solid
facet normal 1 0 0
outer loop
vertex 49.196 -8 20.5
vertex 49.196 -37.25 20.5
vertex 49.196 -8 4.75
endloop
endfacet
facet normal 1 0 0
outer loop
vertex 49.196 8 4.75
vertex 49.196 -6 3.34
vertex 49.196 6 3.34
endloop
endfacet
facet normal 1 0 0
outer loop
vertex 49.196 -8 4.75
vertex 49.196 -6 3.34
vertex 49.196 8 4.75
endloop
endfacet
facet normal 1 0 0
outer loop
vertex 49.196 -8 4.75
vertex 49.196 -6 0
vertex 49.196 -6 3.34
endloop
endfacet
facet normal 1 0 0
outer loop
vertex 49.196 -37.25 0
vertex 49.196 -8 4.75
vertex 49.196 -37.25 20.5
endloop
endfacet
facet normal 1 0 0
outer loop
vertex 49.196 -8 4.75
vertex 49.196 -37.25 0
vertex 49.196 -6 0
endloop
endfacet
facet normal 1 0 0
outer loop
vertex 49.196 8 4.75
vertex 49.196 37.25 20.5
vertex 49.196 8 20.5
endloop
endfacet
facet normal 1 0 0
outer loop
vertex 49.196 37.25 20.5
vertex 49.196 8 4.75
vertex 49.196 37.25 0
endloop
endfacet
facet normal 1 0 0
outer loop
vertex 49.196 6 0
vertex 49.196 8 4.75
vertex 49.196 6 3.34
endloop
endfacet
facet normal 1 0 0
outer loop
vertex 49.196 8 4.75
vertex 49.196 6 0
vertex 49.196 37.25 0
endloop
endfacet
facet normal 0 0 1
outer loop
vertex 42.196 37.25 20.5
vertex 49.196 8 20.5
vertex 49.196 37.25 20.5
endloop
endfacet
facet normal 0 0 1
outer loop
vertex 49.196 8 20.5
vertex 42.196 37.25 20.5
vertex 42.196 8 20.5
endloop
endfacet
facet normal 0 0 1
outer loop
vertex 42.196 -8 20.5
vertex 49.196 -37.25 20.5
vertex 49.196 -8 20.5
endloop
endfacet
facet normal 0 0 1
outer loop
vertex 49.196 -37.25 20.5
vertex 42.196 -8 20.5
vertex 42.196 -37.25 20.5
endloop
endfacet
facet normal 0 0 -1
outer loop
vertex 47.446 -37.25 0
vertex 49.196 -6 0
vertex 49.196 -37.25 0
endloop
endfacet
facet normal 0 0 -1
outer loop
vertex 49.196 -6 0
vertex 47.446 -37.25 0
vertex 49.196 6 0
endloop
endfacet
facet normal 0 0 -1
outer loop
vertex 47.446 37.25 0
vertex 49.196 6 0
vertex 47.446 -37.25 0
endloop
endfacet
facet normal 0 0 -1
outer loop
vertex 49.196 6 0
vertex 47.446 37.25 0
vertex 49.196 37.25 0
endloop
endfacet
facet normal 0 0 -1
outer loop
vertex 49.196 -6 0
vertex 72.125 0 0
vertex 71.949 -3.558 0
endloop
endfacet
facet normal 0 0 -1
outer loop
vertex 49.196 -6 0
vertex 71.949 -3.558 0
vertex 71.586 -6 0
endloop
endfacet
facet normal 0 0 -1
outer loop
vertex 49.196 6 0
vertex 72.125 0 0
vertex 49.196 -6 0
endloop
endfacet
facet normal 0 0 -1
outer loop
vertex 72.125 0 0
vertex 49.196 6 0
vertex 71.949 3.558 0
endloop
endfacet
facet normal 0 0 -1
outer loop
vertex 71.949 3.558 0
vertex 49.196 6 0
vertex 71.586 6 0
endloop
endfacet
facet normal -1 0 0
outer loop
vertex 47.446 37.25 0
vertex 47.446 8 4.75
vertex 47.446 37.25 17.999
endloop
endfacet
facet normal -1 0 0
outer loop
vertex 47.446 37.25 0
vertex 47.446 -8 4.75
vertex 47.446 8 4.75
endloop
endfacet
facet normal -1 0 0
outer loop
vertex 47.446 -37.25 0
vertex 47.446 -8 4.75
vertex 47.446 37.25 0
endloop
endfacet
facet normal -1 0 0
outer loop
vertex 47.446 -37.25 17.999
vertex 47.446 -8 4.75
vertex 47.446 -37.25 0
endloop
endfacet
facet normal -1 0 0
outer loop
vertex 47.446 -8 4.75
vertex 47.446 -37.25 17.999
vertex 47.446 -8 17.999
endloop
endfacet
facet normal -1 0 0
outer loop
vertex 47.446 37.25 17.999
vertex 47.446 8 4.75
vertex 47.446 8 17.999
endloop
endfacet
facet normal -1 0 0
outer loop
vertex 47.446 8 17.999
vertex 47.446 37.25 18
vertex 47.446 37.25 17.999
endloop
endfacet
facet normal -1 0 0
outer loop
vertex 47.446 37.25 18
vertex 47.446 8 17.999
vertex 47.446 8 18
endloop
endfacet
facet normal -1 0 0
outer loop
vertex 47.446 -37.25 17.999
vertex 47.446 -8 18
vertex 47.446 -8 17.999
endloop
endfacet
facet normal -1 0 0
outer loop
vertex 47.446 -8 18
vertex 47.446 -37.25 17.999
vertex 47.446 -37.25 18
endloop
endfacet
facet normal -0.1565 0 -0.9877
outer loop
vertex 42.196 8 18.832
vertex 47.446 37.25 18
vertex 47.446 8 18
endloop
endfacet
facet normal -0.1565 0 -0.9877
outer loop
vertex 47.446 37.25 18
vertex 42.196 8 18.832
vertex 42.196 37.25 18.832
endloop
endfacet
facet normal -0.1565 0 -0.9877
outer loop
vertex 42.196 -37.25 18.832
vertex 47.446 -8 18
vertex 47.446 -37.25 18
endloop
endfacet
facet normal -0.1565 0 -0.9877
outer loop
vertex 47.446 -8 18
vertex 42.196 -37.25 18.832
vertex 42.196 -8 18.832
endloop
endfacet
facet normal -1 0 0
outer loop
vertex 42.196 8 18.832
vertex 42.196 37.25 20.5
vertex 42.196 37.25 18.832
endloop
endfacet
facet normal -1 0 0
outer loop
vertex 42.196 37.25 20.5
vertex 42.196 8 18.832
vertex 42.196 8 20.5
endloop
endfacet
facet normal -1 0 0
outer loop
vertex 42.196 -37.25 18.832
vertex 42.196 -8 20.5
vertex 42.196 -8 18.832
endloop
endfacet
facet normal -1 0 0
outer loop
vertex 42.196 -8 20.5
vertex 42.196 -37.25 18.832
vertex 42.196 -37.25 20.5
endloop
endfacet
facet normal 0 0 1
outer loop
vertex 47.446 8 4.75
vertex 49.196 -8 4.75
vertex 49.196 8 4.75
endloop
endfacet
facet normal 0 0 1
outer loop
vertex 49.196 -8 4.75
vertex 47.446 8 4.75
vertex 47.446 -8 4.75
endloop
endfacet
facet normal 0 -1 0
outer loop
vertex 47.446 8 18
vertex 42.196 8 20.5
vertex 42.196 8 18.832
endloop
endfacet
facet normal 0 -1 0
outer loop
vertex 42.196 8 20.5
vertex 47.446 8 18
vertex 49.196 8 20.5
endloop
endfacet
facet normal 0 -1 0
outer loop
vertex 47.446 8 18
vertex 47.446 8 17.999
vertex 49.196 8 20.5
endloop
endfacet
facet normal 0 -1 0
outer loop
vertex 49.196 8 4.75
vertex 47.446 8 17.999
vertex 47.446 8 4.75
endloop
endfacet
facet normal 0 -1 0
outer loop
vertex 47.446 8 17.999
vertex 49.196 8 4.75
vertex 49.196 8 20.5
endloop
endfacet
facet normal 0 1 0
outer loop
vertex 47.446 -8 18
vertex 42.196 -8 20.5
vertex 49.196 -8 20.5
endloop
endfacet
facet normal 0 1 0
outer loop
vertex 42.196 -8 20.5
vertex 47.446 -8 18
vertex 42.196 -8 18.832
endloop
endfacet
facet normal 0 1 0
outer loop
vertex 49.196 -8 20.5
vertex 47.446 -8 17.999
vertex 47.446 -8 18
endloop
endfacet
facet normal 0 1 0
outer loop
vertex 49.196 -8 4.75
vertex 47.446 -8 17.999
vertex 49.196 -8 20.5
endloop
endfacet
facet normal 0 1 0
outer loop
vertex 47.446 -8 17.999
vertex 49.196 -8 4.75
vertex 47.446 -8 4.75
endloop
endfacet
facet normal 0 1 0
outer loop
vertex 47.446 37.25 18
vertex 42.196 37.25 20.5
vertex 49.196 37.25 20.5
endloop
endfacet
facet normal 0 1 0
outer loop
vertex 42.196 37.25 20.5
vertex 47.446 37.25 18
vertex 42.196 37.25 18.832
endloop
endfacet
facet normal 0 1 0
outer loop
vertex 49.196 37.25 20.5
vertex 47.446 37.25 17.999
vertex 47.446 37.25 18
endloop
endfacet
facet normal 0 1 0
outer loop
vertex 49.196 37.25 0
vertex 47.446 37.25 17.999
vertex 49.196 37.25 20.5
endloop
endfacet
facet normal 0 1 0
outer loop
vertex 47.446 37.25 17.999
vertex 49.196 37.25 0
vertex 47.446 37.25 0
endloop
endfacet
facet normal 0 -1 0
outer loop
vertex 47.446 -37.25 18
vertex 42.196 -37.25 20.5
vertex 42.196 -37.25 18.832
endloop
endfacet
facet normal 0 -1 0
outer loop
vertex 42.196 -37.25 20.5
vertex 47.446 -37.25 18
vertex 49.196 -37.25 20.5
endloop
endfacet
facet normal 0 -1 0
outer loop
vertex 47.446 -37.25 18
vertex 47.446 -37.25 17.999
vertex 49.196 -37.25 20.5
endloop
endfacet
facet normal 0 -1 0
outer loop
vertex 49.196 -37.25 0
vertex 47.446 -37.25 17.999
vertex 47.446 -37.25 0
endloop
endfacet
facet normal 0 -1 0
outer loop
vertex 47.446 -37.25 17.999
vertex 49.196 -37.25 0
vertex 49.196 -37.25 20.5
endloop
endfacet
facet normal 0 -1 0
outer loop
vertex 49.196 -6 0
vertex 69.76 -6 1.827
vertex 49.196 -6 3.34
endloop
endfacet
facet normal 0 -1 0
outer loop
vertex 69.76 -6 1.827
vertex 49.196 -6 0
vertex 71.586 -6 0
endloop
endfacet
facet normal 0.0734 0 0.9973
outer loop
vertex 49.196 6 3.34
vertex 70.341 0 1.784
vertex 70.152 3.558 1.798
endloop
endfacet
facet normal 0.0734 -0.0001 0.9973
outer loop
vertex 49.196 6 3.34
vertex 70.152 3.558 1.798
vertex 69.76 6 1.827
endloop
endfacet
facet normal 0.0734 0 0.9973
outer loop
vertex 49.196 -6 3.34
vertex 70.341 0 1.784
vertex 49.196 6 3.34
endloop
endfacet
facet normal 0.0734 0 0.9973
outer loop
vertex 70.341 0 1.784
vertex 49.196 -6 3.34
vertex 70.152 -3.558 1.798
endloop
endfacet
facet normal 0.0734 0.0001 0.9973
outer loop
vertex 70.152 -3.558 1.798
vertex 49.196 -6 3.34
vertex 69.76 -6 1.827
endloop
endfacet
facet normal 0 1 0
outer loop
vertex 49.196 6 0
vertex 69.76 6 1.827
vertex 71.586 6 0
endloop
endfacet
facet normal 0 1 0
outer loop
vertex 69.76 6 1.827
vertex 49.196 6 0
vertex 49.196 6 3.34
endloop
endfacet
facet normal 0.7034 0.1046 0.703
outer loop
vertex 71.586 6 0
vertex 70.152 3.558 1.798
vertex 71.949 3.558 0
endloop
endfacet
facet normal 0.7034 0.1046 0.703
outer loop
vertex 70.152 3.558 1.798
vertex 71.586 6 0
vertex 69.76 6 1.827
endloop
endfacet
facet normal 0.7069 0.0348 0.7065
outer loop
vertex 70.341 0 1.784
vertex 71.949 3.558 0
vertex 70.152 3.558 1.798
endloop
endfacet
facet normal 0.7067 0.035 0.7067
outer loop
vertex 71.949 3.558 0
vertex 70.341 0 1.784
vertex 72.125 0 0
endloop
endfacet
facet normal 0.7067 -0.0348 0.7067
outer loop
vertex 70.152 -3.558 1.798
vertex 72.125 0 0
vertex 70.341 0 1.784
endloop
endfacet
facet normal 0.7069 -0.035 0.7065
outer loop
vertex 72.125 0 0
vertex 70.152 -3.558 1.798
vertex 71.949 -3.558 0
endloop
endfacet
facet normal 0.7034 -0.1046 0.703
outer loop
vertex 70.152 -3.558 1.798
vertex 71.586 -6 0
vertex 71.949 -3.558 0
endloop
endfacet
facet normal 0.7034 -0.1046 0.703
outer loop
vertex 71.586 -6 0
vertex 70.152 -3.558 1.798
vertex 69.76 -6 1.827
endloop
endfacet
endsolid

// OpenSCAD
S2 = sqrt(2);
ATOM = 0.001;
TOLERANCE = 0.17;
PLAY = 0.4;

PIPE_THICKNESS = 2.5;
PIPE_DIAMETER_INNER = 102;
PIPE_DIAMETER_OUTER = PIPE_DIAMETER_INNER + 2 * PIPE_THICKNESS;
PIPE_MARGIN = 10;
PIPE_HEIGHT = 135 - 4.5; // please manually adjust

WALL_THICKNESS = 3;
WALL_THIN_THICKNESS = 2;
WALL_THINNER_THICKNESS = 1;
REST_HEIGHT = 10;
REST_LENGTH = 25;
BASE_MIN_THICKNESS = 25;
PLUG_GROVE_WIDTH = 12;

CABLE_GROVE_WIDTH = 7;
CABLE_GROVE_HEIGHT = 5;

BASE_GROOVE_WIDTH = 3.5;

CAVITY_WIDTH = 20;
CAVITY_SHORTAGE = 35;
CAVITY_HEIGHT = 30;
CAVITY_SPHERE_RADIUS_TUNING = 3;
CAVITY_SPHERE_SHIFT_TUNING = -3;

MARK_THICKNESS = 0.5;
STOP_THICKNESS = 2;

SUPPORT_THICKNESS = 0.5;

LOGO_TENONS_DISTANCE = 30;
LOGO_TENONS_DIAMETER = 5;
LOGO_TENONS_DEPTH = 10;
LOGO_TENONS_HEIGHT = 7.5;
LOGO_TENONS_X_SHIFT = 5;

SCREW_DIAMETER = 2.9;
SCREW_HEAD_DIAMETER = 5.5;
SCREW_HEAD_THICKNESS = 2;
SCREW_HEIGHT = 12; // overall


$fn = 90;

module barrel(outer_radius, inner_radius, height) {
    scale([1, 1, height])
    difference() {
        cylinder(r=outer_radius);
        if (inner_radius)
            translate([0, 0, -0.5]) scale([1, 1, 2])
            cylinder(r=inner_radius);
    }
}

module trapezoid(size, center, conicity=20, rounded=false) {
//    cube(size, center);
    x = size[0];
    y = size[1];
    z = size[2];
    d = z / conicity; // conicity
    
    points = [
    [ 0,  0,  0 ],  //0
    [ x,  0,  0 ],  //1
    [ x,  y,  0 ],  //2
    [ 0,  y,  0 ],  //3
    [ 0,  d,  z ],  //4
    [ x,  d,  z ],  //5
    [ x,  y-d,  z ],  //6
    [ 0,  y-d,  z ]]; //7

    faces = [
    [0,1,2,3],  // bottom
    [4,5,1,0],  // front
    [7,6,5,4],  // top
    [5,6,2,1],  // right
    [6,7,3,2],  // back
    [7,4,0,3]]; // left

    translate([center ? -x/2 : 0, center ? -y/2 : 0, center ? -z/2 : 0]) {
        polyhedron(points, faces);

        if (rounded)
            translate([x/2, y/2, z])
            scale([1, 1, 0.5])
            rotate([0, 90, 0])
            cylinder(h=x, r=y/2-d, center=true);
    }
}

module screw(head_extent=0, is_clearance_hole=false) {   
    // thread
    translate([0, 0, -SCREW_HEIGHT + SCREW_HEAD_THICKNESS])
    cylinder(h=SCREW_HEIGHT,
             r=SCREW_DIAMETER/2 - TOLERANCE
               + (is_clearance_hole ? TOLERANCE*2 : 0));
    // head
    for (i=[0:head_extent])
        translate([0, 0, i])
        cylinder(h=SCREW_HEAD_THICKNESS, 
                 r=SCREW_HEAD_DIAMETER/2 + (is_clearance_hole ? PLAY : 0));
}

elevation =  BASE_MIN_THICKNESS + PIPE_DIAMETER_INNER/2 + PIPE_MARGIN - WALL_THICKNESS;

module diagonal_end_rest_raw(flat=false, with_hole=false) {
    translate([0, 0, elevation])
    rotate([0, 45, 0]) {
        // bottom-most wall, shorter to create rest
        translate([0, 0, -REST_HEIGHT/2])
        difference() {
            // wall, full surface, creating rest top
            thickness = flat? REST_HEIGHT /2 : REST_LENGTH;
            dz = REST_HEIGHT + thickness/2;
            translate([-dz, 0, dz])
            cube([PIPE_DIAMETER_INNER* S2 *2, PIPE_DIAMETER_INNER, thickness], true);

            // remove extraneous rest top
            translate([-REST_LENGTH-WALL_THICKNESS, 0, REST_HEIGHT])
            cube([PIPE_DIAMETER_INNER* S2 + REST_HEIGHT*S2, PIPE_DIAMETER_INNER+ATOM*2, REST_HEIGHT+REST_LENGTH*2], true);
            
            if (with_hole)
                translate([0, 0, SCREW_HEAD_THICKNESS + WALL_THICKNESS])
                make_screw(true);
        }
    }
}

module diagonal_end_rest(flat=false, with_hole=false) {
    thickness = REST_LENGTH;
    //dz = REST_HEIGHT + thickness/2 +REST_HEIGHT/2;
    dz = WALL_THICKNESS*2;
    rotate([0, flat?-45:0, 0])
    translate([0, 0, flat?-elevation-dz:0])
    intersection() {
        radius = PIPE_DIAMETER_INNER/2;
        diagonal_end_rest_raw(flat, with_hole);
        if (flat)
            barrel(radius-TOLERANCE, 0, PIPE_HEIGHT);
    }
}

module diagonal_end_holes(is_wall) {
    translate([0, 0, elevation])
    rotate([0, 45, 0]) {
        d = is_wall ? LOGO_TENONS_DIAMETER + WALL_THINNER_THICKNESS * 2 : LOGO_TENONS_DIAMETER;
        z =  -REST_HEIGHT/2  +  (is_wall ? WALL_THINNER_THICKNESS : -ATOM);
        translate([LOGO_TENONS_X_SHIFT, +LOGO_TENONS_DISTANCE/2, z])
        cylinder(d=d, h=LOGO_TENONS_DEPTH);
        translate([LOGO_TENONS_X_SHIFT, -LOGO_TENONS_DISTANCE/2, z])
        cylinder(d=d, h=LOGO_TENONS_DEPTH);
    }
}

module make_screw(is_clearance) {
    pos = (PIPE_DIAMETER_INNER* S2 + REST_HEIGHT*S2)/2 - REST_LENGTH + WALL_THICKNESS;
    translate([pos, 0, REST_HEIGHT/2 + WALL_THICKNESS])
    screw(is_clearance_hole=is_clearance);
}

module diagonal_end_raw() {
    translate([0, 0, elevation])
    rotate([0, 45, 0]) {
        difference() {
            union() {
                //
                // bottom-most wall, shorter to create rest
                //
                difference() {
                    union() {
                        translate([-REST_LENGTH, 0, 0])
                        cube([PIPE_DIAMETER_INNER* S2 + REST_HEIGHT*S2, PIPE_DIAMETER_INNER, REST_HEIGHT], true);
                        // cable grove
                        cube([PIPE_DIAMETER_INNER* S2 + REST_HEIGHT*S2, PLUG_GROVE_WIDTH, REST_HEIGHT], true);   
                    }
                    // make wall thinner
                    translate([-REST_LENGTH-WALL_THICKNESS, 0, WALL_THICKNESS*1.5])
                    cube([PIPE_DIAMETER_INNER* S2 + REST_HEIGHT*S2, PIPE_DIAMETER_INNER, REST_HEIGHT+WALL_THICKNESS], true);
                }

                // long diameter foot
                h = PIPE_DIAMETER_INNER;
                hf1 = 1;
                translate([0, 0, h/2*hf1 - REST_HEIGHT/2])
                cube([PIPE_DIAMETER_INNER* S2*S2, WALL_THIN_THICKNESS, h*hf1], true);

                // short diameter foot
                hf2 = 1/4;
                translate([0, 0, PIPE_DIAMETER_INNER/2*hf2 - REST_HEIGHT/2])
                cube([WALL_THIN_THICKNESS, PIPE_DIAMETER_INNER, PIPE_DIAMETER_INNER*hf2], true);
            }
            // screw hole
            make_screw(false);
        }
    }

    diagonal_end_holes(true);
}

module diagonal_end(flat=false) {
    sink = flat ? -elevation + REST_HEIGHT / S2 : 0;
    rot = flat ? -45 : 0;
    
    rotate([0, rot, 0])
    translate([0, 0, sink])
    difference() {
        intersection() {
            diagonal_end_raw();
            barrel(PIPE_DIAMETER_INNER/2, 0, PIPE_HEIGHT);
        }
        // remove rest
        diagonal_end_rest();
        diagonal_end_holes(false);
    }
}

GRIP_HEIGHT = 20 + .5;
GRIP_PLATE_THICKNESS = 2;
GRIP_WALL_THICKNESS = 2;
GRIP_WEDGE = 2.5;
GRIP_WEDGE_ANGLE = 45/5;

module diagonal_grip_raw() {
    translate([0, 0, elevation])
    rotate([0, 45, 0]) {
        difference() {
            union() {
                wl = PIPE_DIAMETER_INNER* S2 + REST_HEIGHT*S2;
                ww = PIPE_DIAMETER_INNER;
                wh = GRIP_HEIGHT;

                translate([-wl/2 - REST_LENGTH, -ww/2, -REST_HEIGHT/2])
                cube([wl, ww, wh]);
            }

            // make wall thinner
            w = PIPE_DIAMETER_INNER* S2 + REST_HEIGHT*S2 +6-GRIP_WALL_THICKNESS;
            l = PIPE_DIAMETER_INNER;
            h = GRIP_HEIGHT - GRIP_WEDGE;

            translate([-REST_LENGTH - WALL_THICKNESS*1.25, 0, -REST_HEIGHT/2-ATOM])
            translate([-w/2, -l/2, 0])
            cube([w, l, h]);

            // keep wedge
            translate([-REST_LENGTH-WALL_THICKNESS*1.25, 0, -REST_HEIGHT/2])
            translate([-w/2, -l/2, 0])
            translate([w, 0, h])
            rotate([0, GRIP_WEDGE_ANGLE, 0])
            translate([-w, 0, -h])
            cube([w, l, h]);

            translate([-REST_LENGTH-WALL_THICKNESS, 0, -REST_HEIGHT/2])
            translate([-w/2, -l/2, 0])
            translate([w, 0, h])
            translate([-w - GRIP_WALL_THICKNESS*3, 0, -h])
            cube([w, l, h*2]);
            
            //remove extraneous
            translate([-PIPE_DIAMETER_INNER*.3, 0, 0 ])
            cube([PIPE_DIAMETER_INNER, PIPE_DIAMETER_INNER, PIPE_DIAMETER_INNER], center=true);
            
            // cable
            cw = PLUG_GROVE_WIDTH + 4;
            translate([-REST_LENGTH-WALL_THICKNESS, 0, - GRIP_WEDGE/2 + REST_HEIGHT])
            translate([0, -cw/2, -h/2])
            translate([w, 0, h])
            translate([-w - GRIP_WALL_THICKNESS*3, 0, -h])
            cube([w, cw, h*2]);
            
            // shavespikes
            /*
            for(y=[-1, 1])
                translate([50, 30.2*y, 16])
                cube([20, 10, 10], center=true);
            */
        }
    }
}

module diagonal_grip_leg() {
    translate([0, 0, elevation])
    rotate([0, 45, 0]) {
        difference() {
            // cable grove
            cl = PIPE_DIAMETER_INNER* S2 + REST_HEIGHT*S2;
            cw = PLUG_GROVE_WIDTH;
            ch = GRIP_PLATE_THICKNESS;   
            w = PIPE_DIAMETER_INNER* S2 + REST_HEIGHT*S2 +6-GRIP_WALL_THICKNESS;
            l = PIPE_DIAMETER_INNER;
            h = GRIP_HEIGHT - GRIP_WEDGE;

            hull() {
                translate([-cl/2, -cw/2, -REST_HEIGHT/2])
                cube([cl, cw, ch*.75], !true);   

                translate([-cl/2 - REST_LENGTH, -cw/2, -REST_HEIGHT/2])
                cube([cl, cw, ch*1.67], !true);   
            }
            
            translate([-REST_LENGTH - WALL_THICKNESS*1.25, 0, -REST_HEIGHT/2-ATOM])
            translate([-w/2, -l/2, 0])
            cube([w, l, h]);
        }
    }
}


module diagonal_grip(flat=false) {
    sink = flat ? -elevation + REST_HEIGHT / S2 : 0;
    rot = flat ? -45 : 0;
    
    rotate([0, rot, 0])
    translate([0, 0, sink]) {
        intersection() {
            diagonal_grip_raw();

    //%        barrel(PIPE_DIAMETER_INNER/2, 0, PIPE_HEIGHT);

            // clip sides
            cube([300, 72.5+2, 300], center=true);
        }

        intersection() {
            diagonal_grip_leg();
            barrel(PIPE_DIAMETER_INNER/2, 0, PIPE_HEIGHT);
        }

    }

}

!diagonal_grip(true);

module perpendicular_end_raw(recess) {
    // small chamber
    translate([0, 0, CABLE_GROVE_HEIGHT/2 + PIPE_MARGIN/2])
    trapezoid([PIPE_DIAMETER_OUTER, CABLE_GROVE_WIDTH-recess*2, CABLE_GROVE_HEIGHT + PIPE_MARGIN], true, 10, true);

    // big chamber
    translate([-CAVITY_SHORTAGE/2, 0, CAVITY_HEIGHT/2 + PIPE_MARGIN/2]) {
        intersection() {
            trapezoid([PIPE_DIAMETER_INNER-CAVITY_SHORTAGE, CAVITY_WIDTH-recess*2, CAVITY_HEIGHT + PIPE_MARGIN], true, 10, true);
        
            translate([-PIPE_DIAMETER_INNER/8 + CAVITY_SPHERE_SHIFT_TUNING, 0, -PIPE_DIAMETER_INNER/4])
            sphere(d=PIPE_DIAMETER_INNER + CAVITY_SPHERE_RADIUS_TUNING);
        }
    }

    if (!recess) {
        // small chamber mark
        translate([0, 0, PIPE_MARGIN/2])
        trapezoid([PIPE_DIAMETER_OUTER, CABLE_GROVE_WIDTH+MARK_THICKNESS*2-recess*2, PIPE_MARGIN], true);

        // big chamber mark
        translate([-CAVITY_SHORTAGE/2, 0, PIPE_MARGIN/2])
        trapezoid([PIPE_DIAMETER_INNER-CAVITY_SHORTAGE, CAVITY_WIDTH+MARK_THICKNESS*2-recess*2, PIPE_MARGIN], true);
        
        // strut
        strut_height = WALL_THICKNESS;
        translate([0, 0, strut_height/2])
        cube([WALL_THICKNESS, PIPE_DIAMETER_INNER, strut_height], true); 
    }
}

module perpendicular_end_stop() {
    difference() {
        union() {
            // small chamber base
            translate([0, 0, -STOP_THICKNESS/2])
            cube([PIPE_DIAMETER_OUTER, CABLE_GROVE_WIDTH + MARK_THICKNESS*2, STOP_THICKNESS], true);

            // big chamber base
            translate([-CAVITY_SHORTAGE/2 -PIPE_THICKNESS/2, 0, -STOP_THICKNESS/2])
            cube([PIPE_DIAMETER_OUTER-PIPE_THICKNESS-CAVITY_SHORTAGE, CAVITY_WIDTH+MARK_THICKNESS*2, STOP_THICKNESS], true);
            
            // strut
            translate([0, 0, -STOP_THICKNESS/2])
            cube([WALL_THICKNESS, PIPE_DIAMETER_OUTER, STOP_THICKNESS], true); 
        }
        // groove
        translate([0, 0, -STOP_THICKNESS/2])
        cube([PIPE_DIAMETER_OUTER+ATOM, BASE_GROOVE_WIDTH, STOP_THICKNESS+ATOM], true);
    }

    // groove filler
    translate([WALL_THICKNESS+5, PIPE_DIAMETER_OUTER/2 +CAVITY_WIDTH/2 + 5 , -STOP_THICKNESS/2])
    //%translate([0, 0 , -STOP_THICKNESS/2 -STOP_THICKNESS ])
    {
        // grove filler
        translate([0, 0, STOP_THICKNESS])
        cube([PIPE_DIAMETER_OUTER+ATOM, BASE_GROOVE_WIDTH - TOLERANCE*1.5, STOP_THICKNESS+ATOM], true);

        // support (cross)
        cube([PIPE_DIAMETER_OUTER+ATOM, CABLE_GROVE_WIDTH + MARK_THICKNESS*2, STOP_THICKNESS+ATOM], true);
        cube([WALL_THICKNESS, PIPE_DIAMETER_OUTER * .8, STOP_THICKNESS], true); 
    }
}

module perpendicular_end(flat=false) {
    translate([0, 0, flat ? STOP_THICKNESS : 0])
    {
        intersection() {
            difference() {
                perpendicular_end_raw(0);
                translate([-WALL_THINNER_THICKNESS, 0, -WALL_THINNER_THICKNESS])
                perpendicular_end_raw(WALL_THINNER_THICKNESS);
            }
            barrel(PIPE_DIAMETER_INNER/2, 0, PIPE_HEIGHT);
        }
        perpendicular_end_stop();
    }
}

///////////////////////


PLATE_THICKNESS = 0.8;
PLATE_WIDTH = 44;
PLATE_HEIGHT = 17;
FONT_SIZE = 6;
FONT = "Arial:style=Bold";
FONT_THICKNESS = 0.4;
FONT_SPACING = 1.2;

module write(text, valign) {
    scale([0.8, 1, 1]) // make font narrow
    linear_extrude(height=FONT_THICKNESS)
    text(text, halign="center", valign=valign,
         size=FONT_SIZE, font=FONT, spacing=FONT_SPACING);
}

module fplate() {
// Tenons
for (i=[-1, 1])
    translate([i*LOGO_TENONS_DISTANCE/2, 0, PLATE_THICKNESS])
    cylinder(d=LOGO_TENONS_DIAMETER - TOLERANCE*8.1, h=LOGO_TENONS_HEIGHT);

K = 1.2;
scale([K, K, 1])
difference() {
    // Plate
    translate([0, 0, PLATE_THICKNESS/2 + ATOM])
    cube([PLATE_WIDTH, PLATE_HEIGHT, PLATE_THICKNESS], true);

    // Engraved texts
    translate([0.5, +1, 0]) write("FABLAB", valign="bottom");
    translate([0.5, -1, 0]) write("FRIBOURG", valign="top");
 }
 
if(0) translate([0, 12, 0])
 cylinder(d=1.5, h=0.4);
}

translate([120, 90, 0])
fplate();

///////////////////////

perpendicular_end();
%diagonal_end();
%barrel(PIPE_DIAMETER_OUTER/2, PIPE_DIAMETER_INNER/2, PIPE_HEIGHT);

translate([150, 0, 0])
diagonal_end(flat=true);



///////////////////////

translate([170, 0, 0])
difference() {
    diagonal_end_rest(flat=true, with_hole=true);

    translate([WALL_THICKNESS, 0, WALL_THICKNESS])
    diagonal_end_rest(flat=true, with_hole=false);
}
